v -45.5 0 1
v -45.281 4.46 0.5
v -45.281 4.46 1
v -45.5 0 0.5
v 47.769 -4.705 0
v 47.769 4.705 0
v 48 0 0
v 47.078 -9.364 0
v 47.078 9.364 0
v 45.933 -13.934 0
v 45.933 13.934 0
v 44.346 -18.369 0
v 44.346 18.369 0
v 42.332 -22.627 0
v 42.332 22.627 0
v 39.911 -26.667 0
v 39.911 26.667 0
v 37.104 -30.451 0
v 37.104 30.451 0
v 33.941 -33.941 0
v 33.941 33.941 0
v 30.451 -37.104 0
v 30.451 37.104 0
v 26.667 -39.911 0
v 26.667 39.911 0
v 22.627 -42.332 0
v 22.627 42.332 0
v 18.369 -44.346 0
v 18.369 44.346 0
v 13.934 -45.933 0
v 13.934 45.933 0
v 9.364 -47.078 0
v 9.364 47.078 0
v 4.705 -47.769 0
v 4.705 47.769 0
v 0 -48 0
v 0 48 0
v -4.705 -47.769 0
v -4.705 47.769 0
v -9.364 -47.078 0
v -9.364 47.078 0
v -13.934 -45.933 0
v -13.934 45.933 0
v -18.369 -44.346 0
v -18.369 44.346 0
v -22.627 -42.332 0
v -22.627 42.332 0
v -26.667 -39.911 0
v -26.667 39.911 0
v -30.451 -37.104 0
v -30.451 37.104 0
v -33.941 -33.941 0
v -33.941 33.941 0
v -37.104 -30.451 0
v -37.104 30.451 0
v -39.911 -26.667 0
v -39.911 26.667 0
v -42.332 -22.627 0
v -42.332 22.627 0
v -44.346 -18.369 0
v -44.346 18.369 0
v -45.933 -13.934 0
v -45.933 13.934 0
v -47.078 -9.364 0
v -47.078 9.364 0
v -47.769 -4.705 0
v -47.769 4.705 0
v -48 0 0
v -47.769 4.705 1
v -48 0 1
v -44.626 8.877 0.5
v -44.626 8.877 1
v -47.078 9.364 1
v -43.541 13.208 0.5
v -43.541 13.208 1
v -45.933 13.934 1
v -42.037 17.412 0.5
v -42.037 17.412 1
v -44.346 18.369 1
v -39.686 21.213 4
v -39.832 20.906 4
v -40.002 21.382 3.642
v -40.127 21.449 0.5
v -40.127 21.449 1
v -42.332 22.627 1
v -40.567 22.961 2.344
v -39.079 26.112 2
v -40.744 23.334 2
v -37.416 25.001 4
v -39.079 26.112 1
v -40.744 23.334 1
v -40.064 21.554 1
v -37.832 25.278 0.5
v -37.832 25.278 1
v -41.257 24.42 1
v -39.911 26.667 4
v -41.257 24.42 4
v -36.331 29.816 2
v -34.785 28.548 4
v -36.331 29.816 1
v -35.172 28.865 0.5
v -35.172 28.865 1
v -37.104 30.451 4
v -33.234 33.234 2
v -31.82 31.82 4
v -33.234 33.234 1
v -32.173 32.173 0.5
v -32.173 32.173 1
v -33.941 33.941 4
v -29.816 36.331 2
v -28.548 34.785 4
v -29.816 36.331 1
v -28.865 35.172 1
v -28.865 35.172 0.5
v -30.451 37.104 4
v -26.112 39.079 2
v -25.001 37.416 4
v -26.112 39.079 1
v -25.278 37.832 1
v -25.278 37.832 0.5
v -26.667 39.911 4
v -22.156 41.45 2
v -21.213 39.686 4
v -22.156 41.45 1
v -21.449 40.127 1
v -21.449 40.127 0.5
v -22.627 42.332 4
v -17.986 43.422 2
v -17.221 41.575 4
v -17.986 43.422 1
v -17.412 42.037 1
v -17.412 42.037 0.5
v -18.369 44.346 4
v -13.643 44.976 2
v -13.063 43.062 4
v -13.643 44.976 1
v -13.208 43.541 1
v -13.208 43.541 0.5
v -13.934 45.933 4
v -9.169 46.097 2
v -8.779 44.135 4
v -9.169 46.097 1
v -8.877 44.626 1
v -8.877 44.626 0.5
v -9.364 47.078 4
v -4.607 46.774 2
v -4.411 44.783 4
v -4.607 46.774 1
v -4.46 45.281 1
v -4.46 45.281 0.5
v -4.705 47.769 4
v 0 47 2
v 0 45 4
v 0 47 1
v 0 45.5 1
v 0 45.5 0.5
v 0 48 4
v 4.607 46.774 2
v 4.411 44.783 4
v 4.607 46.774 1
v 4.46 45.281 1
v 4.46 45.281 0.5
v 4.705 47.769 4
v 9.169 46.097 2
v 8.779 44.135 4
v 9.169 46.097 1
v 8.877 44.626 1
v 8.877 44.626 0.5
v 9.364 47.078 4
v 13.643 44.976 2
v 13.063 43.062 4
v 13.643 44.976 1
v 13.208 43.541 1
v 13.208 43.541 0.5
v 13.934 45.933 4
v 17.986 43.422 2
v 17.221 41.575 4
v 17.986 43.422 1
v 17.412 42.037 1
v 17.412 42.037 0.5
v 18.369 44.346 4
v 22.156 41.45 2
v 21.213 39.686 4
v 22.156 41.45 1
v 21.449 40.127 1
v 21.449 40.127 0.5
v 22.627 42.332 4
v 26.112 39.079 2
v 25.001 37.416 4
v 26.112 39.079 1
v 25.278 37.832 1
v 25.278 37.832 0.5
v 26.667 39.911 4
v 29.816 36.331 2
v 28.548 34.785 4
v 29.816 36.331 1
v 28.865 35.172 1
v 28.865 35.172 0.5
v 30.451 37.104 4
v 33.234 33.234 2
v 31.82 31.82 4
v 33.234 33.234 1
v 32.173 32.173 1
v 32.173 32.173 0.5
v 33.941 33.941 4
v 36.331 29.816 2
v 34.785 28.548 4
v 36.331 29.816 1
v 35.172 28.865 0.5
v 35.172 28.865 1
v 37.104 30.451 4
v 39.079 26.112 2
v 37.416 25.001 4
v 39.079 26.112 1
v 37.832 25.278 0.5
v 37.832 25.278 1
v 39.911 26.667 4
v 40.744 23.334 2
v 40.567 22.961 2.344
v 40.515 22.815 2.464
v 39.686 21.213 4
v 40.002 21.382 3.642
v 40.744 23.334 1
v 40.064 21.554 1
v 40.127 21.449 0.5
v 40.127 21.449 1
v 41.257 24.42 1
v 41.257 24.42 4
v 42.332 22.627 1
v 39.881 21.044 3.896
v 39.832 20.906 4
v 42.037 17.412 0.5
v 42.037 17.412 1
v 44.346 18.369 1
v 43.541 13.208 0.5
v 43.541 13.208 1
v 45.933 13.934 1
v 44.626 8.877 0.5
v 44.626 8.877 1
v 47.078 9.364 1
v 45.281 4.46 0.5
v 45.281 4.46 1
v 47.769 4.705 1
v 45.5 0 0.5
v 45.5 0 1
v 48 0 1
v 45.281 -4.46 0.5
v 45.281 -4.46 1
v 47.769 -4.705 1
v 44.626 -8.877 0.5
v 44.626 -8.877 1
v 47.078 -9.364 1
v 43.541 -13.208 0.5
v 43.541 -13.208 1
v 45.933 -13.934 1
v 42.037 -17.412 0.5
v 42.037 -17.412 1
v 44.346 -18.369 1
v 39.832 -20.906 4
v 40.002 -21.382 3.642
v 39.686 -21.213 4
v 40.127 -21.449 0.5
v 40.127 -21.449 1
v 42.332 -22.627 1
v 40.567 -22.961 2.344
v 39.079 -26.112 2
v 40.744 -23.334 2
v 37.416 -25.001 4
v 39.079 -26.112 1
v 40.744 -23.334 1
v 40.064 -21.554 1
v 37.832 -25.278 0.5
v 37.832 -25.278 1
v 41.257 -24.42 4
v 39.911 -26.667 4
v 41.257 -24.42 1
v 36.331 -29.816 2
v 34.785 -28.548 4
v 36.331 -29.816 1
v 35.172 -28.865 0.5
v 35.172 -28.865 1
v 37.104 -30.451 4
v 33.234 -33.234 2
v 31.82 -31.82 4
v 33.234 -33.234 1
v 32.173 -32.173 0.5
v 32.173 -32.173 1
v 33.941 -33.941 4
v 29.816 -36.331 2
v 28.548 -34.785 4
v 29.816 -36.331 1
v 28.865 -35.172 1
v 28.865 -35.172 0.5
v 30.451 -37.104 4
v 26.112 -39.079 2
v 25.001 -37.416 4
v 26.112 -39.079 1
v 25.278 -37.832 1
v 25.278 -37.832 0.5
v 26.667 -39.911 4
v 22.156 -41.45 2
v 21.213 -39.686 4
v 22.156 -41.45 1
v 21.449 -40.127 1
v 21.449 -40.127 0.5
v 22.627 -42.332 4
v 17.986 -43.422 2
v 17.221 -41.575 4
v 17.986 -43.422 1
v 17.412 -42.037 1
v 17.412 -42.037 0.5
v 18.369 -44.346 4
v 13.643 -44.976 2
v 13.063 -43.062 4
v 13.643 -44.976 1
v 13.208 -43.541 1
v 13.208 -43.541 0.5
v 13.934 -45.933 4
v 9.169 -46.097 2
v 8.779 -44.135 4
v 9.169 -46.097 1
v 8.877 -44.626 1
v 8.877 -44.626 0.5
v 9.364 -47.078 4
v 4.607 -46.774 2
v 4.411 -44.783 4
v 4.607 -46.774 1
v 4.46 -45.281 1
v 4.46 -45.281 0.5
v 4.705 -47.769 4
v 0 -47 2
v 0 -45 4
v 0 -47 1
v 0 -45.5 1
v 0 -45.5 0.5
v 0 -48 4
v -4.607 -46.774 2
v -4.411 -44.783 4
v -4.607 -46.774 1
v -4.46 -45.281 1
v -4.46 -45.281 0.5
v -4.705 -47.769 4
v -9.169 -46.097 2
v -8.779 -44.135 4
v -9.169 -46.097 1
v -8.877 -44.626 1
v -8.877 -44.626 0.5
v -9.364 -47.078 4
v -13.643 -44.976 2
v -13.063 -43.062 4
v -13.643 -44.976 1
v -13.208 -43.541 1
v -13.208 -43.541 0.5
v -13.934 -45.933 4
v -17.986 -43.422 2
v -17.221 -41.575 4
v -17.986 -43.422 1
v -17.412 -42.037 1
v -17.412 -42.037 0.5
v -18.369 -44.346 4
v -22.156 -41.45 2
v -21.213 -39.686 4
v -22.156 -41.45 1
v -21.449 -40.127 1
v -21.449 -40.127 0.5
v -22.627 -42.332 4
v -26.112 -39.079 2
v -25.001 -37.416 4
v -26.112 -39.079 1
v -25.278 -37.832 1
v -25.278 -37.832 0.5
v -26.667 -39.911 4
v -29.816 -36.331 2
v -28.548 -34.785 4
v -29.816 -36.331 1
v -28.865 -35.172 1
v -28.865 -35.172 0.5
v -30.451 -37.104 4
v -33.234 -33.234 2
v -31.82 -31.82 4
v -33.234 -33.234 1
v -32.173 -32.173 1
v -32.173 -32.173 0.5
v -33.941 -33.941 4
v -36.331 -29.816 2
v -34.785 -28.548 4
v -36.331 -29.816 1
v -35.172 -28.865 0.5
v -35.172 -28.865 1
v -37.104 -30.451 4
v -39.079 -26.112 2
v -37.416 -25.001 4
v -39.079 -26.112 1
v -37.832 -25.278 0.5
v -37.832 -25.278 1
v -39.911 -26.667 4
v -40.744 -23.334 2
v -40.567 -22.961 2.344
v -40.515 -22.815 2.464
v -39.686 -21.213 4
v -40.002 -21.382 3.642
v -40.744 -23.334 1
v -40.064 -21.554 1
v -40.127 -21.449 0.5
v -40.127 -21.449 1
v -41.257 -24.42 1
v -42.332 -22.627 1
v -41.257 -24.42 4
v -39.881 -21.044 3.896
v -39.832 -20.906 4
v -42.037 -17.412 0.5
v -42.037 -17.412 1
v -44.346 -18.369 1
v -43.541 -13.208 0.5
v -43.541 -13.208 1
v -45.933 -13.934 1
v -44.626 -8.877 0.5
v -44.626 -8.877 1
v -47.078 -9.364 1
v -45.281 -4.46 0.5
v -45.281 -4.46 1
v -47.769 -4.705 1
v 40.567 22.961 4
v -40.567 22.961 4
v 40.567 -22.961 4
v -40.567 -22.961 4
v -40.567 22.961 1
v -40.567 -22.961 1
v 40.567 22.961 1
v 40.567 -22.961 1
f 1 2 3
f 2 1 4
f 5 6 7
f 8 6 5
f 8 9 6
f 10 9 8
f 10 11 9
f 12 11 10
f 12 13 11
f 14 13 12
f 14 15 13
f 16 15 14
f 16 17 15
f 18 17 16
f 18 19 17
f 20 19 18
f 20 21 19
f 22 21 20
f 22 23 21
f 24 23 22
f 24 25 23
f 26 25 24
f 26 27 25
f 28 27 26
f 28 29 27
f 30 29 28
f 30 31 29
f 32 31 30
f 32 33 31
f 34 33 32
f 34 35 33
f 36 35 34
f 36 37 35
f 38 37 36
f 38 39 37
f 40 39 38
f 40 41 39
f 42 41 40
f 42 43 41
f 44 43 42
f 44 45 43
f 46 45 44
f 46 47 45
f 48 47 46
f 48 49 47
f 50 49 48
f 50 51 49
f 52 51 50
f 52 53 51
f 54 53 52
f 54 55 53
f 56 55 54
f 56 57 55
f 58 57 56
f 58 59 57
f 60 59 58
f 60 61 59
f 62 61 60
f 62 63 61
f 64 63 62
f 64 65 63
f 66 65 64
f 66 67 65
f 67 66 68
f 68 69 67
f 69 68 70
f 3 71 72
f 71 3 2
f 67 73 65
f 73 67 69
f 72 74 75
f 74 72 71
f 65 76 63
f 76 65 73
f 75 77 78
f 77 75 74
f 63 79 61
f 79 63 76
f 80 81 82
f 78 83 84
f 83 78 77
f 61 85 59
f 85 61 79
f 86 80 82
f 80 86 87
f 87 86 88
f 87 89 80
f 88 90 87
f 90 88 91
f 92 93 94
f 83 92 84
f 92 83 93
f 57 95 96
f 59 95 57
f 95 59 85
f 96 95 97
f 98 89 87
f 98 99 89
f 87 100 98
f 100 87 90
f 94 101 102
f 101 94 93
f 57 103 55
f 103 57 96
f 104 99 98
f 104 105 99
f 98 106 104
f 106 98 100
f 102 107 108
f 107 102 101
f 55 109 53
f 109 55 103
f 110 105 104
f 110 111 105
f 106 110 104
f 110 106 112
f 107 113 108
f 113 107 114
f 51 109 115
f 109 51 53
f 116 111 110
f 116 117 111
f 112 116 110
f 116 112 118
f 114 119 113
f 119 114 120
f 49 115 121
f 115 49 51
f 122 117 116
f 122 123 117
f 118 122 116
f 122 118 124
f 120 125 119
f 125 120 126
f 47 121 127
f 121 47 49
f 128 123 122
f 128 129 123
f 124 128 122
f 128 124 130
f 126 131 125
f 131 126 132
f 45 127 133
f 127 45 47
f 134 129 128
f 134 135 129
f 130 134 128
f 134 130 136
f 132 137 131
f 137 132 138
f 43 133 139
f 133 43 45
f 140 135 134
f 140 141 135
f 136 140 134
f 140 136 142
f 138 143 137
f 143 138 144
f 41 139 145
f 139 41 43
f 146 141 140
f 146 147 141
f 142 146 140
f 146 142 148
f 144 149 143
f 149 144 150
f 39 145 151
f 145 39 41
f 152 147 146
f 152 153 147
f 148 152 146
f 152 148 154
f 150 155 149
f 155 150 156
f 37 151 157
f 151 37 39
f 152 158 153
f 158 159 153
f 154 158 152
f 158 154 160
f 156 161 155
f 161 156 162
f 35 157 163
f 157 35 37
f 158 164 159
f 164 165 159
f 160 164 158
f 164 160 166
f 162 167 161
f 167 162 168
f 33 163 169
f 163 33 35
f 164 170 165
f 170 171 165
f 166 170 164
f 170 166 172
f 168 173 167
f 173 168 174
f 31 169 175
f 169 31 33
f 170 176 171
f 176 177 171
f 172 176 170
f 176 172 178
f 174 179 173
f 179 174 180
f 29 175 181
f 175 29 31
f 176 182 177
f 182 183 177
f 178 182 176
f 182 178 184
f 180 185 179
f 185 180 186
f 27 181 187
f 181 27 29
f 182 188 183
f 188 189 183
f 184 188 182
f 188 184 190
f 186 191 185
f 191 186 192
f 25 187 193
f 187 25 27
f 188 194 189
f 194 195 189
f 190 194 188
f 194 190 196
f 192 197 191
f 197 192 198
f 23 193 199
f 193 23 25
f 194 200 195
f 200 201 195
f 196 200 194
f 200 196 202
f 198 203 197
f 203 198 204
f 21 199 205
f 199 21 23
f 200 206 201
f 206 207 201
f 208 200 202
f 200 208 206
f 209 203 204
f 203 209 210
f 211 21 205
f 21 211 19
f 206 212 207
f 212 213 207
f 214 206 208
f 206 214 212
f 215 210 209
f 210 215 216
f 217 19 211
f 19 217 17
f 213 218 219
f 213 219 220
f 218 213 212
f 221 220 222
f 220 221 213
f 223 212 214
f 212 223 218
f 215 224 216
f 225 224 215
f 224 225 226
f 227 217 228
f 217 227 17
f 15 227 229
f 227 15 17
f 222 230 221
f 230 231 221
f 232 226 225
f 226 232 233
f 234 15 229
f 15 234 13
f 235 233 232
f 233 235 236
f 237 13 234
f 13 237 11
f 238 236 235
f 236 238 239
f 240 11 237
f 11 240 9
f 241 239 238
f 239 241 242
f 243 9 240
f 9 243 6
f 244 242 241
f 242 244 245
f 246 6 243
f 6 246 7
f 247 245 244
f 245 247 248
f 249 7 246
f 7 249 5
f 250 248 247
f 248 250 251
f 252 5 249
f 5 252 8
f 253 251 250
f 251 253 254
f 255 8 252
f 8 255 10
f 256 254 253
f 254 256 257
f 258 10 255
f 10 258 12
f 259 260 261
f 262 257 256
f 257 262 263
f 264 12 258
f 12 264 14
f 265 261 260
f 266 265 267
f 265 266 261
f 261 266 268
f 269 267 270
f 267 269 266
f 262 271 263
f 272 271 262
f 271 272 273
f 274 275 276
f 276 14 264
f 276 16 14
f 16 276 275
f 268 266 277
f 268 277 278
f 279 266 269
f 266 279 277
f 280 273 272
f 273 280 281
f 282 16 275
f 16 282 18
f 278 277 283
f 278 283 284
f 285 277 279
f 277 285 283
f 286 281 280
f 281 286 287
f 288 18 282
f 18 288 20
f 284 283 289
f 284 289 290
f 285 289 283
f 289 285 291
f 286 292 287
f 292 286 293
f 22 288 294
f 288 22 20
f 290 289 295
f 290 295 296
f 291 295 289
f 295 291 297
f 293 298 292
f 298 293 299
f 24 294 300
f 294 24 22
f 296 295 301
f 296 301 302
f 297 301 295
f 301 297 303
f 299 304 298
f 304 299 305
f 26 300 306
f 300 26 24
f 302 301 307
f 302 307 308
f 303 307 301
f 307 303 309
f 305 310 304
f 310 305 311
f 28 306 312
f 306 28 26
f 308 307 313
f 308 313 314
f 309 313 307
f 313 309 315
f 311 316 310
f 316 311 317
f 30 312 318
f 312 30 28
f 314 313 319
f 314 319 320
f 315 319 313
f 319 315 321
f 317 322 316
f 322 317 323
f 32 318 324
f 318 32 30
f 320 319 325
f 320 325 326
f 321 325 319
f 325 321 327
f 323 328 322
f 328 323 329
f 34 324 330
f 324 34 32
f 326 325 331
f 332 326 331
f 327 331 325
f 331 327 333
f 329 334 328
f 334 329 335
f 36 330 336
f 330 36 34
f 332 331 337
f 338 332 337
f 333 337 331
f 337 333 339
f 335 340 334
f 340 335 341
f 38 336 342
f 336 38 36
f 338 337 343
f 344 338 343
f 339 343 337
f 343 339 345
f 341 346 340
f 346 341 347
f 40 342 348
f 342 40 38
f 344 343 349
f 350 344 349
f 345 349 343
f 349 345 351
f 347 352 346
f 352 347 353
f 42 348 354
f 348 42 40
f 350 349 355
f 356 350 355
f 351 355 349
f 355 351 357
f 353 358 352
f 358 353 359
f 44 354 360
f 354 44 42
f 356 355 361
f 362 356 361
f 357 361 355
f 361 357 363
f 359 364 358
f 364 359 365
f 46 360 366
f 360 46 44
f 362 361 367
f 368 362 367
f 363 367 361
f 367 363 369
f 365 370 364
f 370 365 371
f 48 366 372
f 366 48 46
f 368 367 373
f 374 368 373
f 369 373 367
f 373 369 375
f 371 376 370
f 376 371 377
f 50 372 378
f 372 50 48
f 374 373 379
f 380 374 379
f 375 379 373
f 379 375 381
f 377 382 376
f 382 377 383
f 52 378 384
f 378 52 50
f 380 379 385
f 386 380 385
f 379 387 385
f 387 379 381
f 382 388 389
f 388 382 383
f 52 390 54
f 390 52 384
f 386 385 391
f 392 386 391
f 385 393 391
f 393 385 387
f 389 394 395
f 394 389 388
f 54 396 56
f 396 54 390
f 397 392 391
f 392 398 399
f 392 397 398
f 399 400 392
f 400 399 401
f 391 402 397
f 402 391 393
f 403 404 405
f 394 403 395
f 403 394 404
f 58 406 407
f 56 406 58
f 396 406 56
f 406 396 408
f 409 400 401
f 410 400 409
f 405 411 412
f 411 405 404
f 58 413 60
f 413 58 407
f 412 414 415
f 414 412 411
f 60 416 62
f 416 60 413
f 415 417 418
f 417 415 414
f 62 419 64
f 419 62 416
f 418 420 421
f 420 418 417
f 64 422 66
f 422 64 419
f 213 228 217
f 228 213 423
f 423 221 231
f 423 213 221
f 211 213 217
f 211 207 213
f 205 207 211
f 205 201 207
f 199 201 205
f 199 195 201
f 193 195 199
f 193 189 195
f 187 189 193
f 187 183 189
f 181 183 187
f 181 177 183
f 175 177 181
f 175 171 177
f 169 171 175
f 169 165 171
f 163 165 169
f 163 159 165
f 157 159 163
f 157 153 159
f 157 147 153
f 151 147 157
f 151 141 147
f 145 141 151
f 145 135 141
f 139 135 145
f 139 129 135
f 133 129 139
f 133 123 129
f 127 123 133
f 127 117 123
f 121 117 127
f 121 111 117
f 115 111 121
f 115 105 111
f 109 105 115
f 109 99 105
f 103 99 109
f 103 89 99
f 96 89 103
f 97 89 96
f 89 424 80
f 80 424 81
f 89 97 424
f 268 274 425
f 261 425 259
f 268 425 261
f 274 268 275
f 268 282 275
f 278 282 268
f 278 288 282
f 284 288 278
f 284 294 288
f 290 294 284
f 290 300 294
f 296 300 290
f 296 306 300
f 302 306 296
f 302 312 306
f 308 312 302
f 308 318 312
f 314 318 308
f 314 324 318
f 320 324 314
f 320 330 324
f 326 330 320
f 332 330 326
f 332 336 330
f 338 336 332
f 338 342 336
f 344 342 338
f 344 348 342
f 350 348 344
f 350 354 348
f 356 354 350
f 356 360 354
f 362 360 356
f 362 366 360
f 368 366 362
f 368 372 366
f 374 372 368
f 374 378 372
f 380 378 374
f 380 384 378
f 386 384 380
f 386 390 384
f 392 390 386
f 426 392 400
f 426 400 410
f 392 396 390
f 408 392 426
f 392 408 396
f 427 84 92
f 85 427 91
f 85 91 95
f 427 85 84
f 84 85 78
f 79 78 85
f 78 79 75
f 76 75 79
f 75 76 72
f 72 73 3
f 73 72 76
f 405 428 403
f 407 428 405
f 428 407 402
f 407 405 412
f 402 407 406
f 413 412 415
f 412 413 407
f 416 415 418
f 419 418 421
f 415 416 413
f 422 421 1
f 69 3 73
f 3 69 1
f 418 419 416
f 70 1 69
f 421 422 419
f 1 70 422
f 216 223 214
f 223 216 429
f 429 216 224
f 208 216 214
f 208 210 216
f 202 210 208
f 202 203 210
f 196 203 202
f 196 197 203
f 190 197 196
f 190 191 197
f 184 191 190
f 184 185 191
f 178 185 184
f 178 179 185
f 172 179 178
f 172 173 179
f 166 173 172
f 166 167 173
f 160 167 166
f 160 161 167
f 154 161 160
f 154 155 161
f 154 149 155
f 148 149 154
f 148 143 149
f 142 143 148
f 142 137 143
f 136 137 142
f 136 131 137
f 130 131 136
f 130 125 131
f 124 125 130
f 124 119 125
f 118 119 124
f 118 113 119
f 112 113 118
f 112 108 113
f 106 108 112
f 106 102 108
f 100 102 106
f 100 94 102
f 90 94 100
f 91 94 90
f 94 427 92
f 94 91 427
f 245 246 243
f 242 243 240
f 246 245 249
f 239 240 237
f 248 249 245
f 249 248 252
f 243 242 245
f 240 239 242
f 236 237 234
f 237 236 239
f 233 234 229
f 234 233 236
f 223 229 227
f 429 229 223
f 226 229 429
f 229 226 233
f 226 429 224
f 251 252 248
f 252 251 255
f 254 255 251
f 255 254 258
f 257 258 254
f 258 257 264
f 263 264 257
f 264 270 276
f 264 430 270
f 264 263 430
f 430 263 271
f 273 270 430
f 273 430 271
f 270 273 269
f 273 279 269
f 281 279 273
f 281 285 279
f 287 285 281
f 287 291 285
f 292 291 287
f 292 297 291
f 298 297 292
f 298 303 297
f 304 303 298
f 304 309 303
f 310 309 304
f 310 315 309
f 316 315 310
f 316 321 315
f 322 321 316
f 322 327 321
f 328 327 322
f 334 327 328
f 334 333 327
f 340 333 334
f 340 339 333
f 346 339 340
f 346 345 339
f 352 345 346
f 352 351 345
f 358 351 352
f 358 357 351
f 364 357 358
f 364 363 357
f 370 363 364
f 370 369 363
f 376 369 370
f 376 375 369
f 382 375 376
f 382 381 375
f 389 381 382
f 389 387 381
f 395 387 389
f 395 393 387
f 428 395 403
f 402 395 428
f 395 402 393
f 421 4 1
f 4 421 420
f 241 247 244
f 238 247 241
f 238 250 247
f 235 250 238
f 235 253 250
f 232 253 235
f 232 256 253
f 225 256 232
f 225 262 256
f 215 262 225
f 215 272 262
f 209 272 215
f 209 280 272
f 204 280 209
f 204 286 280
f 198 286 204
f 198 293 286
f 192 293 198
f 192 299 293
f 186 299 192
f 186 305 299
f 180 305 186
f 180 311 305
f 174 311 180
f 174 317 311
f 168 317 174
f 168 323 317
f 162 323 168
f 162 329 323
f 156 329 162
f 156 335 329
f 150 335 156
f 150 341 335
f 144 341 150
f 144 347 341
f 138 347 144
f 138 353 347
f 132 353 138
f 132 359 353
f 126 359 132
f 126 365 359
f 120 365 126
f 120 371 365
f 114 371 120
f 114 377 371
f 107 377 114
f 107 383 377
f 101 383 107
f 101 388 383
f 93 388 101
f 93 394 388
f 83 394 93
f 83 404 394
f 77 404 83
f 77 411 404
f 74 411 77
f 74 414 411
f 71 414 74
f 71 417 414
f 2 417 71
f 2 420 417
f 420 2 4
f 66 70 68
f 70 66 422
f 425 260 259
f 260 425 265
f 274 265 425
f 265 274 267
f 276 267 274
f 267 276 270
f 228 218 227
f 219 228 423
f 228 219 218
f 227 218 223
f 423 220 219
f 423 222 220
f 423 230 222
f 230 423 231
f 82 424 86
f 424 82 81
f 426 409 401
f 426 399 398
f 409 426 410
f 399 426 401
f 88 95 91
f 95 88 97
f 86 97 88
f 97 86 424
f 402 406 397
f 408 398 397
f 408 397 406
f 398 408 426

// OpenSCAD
/* This file is free software and comes with NO WARRANTY -
 * --- GPL-v2 --- read the file
 * COPYING for details  
 * 04/2018 T. Kanese crated this little piece of software 

/* TODO: 
   * make the border more robust so that it does not tear off.
   * Customize for different sizes.
*/

/* [Main Dimensions] */

// Outer Diameter (mm)
dia=96;  // [40:120]



/* [Hidden] */
idia=dia-5;
$fn=64;
// Tolerance (smallest value) (mm)
eps=0.1;         // [0.1:0.3]

difference() {
  rotate_extrude() polygon( 
    points=[[0,0],[dia/2,0],[dia/2,4],[dia/2-3,4],[dia/2-1,2],[dia/2-1,1],
            [idia/2,1],[idia/2,0.5],[0,0.5]] );
  translate([dia,0,1]) cylinder(r=60,h=4);
  translate([-dia,0,1]) cylinder(r=60,h=4);    
}
